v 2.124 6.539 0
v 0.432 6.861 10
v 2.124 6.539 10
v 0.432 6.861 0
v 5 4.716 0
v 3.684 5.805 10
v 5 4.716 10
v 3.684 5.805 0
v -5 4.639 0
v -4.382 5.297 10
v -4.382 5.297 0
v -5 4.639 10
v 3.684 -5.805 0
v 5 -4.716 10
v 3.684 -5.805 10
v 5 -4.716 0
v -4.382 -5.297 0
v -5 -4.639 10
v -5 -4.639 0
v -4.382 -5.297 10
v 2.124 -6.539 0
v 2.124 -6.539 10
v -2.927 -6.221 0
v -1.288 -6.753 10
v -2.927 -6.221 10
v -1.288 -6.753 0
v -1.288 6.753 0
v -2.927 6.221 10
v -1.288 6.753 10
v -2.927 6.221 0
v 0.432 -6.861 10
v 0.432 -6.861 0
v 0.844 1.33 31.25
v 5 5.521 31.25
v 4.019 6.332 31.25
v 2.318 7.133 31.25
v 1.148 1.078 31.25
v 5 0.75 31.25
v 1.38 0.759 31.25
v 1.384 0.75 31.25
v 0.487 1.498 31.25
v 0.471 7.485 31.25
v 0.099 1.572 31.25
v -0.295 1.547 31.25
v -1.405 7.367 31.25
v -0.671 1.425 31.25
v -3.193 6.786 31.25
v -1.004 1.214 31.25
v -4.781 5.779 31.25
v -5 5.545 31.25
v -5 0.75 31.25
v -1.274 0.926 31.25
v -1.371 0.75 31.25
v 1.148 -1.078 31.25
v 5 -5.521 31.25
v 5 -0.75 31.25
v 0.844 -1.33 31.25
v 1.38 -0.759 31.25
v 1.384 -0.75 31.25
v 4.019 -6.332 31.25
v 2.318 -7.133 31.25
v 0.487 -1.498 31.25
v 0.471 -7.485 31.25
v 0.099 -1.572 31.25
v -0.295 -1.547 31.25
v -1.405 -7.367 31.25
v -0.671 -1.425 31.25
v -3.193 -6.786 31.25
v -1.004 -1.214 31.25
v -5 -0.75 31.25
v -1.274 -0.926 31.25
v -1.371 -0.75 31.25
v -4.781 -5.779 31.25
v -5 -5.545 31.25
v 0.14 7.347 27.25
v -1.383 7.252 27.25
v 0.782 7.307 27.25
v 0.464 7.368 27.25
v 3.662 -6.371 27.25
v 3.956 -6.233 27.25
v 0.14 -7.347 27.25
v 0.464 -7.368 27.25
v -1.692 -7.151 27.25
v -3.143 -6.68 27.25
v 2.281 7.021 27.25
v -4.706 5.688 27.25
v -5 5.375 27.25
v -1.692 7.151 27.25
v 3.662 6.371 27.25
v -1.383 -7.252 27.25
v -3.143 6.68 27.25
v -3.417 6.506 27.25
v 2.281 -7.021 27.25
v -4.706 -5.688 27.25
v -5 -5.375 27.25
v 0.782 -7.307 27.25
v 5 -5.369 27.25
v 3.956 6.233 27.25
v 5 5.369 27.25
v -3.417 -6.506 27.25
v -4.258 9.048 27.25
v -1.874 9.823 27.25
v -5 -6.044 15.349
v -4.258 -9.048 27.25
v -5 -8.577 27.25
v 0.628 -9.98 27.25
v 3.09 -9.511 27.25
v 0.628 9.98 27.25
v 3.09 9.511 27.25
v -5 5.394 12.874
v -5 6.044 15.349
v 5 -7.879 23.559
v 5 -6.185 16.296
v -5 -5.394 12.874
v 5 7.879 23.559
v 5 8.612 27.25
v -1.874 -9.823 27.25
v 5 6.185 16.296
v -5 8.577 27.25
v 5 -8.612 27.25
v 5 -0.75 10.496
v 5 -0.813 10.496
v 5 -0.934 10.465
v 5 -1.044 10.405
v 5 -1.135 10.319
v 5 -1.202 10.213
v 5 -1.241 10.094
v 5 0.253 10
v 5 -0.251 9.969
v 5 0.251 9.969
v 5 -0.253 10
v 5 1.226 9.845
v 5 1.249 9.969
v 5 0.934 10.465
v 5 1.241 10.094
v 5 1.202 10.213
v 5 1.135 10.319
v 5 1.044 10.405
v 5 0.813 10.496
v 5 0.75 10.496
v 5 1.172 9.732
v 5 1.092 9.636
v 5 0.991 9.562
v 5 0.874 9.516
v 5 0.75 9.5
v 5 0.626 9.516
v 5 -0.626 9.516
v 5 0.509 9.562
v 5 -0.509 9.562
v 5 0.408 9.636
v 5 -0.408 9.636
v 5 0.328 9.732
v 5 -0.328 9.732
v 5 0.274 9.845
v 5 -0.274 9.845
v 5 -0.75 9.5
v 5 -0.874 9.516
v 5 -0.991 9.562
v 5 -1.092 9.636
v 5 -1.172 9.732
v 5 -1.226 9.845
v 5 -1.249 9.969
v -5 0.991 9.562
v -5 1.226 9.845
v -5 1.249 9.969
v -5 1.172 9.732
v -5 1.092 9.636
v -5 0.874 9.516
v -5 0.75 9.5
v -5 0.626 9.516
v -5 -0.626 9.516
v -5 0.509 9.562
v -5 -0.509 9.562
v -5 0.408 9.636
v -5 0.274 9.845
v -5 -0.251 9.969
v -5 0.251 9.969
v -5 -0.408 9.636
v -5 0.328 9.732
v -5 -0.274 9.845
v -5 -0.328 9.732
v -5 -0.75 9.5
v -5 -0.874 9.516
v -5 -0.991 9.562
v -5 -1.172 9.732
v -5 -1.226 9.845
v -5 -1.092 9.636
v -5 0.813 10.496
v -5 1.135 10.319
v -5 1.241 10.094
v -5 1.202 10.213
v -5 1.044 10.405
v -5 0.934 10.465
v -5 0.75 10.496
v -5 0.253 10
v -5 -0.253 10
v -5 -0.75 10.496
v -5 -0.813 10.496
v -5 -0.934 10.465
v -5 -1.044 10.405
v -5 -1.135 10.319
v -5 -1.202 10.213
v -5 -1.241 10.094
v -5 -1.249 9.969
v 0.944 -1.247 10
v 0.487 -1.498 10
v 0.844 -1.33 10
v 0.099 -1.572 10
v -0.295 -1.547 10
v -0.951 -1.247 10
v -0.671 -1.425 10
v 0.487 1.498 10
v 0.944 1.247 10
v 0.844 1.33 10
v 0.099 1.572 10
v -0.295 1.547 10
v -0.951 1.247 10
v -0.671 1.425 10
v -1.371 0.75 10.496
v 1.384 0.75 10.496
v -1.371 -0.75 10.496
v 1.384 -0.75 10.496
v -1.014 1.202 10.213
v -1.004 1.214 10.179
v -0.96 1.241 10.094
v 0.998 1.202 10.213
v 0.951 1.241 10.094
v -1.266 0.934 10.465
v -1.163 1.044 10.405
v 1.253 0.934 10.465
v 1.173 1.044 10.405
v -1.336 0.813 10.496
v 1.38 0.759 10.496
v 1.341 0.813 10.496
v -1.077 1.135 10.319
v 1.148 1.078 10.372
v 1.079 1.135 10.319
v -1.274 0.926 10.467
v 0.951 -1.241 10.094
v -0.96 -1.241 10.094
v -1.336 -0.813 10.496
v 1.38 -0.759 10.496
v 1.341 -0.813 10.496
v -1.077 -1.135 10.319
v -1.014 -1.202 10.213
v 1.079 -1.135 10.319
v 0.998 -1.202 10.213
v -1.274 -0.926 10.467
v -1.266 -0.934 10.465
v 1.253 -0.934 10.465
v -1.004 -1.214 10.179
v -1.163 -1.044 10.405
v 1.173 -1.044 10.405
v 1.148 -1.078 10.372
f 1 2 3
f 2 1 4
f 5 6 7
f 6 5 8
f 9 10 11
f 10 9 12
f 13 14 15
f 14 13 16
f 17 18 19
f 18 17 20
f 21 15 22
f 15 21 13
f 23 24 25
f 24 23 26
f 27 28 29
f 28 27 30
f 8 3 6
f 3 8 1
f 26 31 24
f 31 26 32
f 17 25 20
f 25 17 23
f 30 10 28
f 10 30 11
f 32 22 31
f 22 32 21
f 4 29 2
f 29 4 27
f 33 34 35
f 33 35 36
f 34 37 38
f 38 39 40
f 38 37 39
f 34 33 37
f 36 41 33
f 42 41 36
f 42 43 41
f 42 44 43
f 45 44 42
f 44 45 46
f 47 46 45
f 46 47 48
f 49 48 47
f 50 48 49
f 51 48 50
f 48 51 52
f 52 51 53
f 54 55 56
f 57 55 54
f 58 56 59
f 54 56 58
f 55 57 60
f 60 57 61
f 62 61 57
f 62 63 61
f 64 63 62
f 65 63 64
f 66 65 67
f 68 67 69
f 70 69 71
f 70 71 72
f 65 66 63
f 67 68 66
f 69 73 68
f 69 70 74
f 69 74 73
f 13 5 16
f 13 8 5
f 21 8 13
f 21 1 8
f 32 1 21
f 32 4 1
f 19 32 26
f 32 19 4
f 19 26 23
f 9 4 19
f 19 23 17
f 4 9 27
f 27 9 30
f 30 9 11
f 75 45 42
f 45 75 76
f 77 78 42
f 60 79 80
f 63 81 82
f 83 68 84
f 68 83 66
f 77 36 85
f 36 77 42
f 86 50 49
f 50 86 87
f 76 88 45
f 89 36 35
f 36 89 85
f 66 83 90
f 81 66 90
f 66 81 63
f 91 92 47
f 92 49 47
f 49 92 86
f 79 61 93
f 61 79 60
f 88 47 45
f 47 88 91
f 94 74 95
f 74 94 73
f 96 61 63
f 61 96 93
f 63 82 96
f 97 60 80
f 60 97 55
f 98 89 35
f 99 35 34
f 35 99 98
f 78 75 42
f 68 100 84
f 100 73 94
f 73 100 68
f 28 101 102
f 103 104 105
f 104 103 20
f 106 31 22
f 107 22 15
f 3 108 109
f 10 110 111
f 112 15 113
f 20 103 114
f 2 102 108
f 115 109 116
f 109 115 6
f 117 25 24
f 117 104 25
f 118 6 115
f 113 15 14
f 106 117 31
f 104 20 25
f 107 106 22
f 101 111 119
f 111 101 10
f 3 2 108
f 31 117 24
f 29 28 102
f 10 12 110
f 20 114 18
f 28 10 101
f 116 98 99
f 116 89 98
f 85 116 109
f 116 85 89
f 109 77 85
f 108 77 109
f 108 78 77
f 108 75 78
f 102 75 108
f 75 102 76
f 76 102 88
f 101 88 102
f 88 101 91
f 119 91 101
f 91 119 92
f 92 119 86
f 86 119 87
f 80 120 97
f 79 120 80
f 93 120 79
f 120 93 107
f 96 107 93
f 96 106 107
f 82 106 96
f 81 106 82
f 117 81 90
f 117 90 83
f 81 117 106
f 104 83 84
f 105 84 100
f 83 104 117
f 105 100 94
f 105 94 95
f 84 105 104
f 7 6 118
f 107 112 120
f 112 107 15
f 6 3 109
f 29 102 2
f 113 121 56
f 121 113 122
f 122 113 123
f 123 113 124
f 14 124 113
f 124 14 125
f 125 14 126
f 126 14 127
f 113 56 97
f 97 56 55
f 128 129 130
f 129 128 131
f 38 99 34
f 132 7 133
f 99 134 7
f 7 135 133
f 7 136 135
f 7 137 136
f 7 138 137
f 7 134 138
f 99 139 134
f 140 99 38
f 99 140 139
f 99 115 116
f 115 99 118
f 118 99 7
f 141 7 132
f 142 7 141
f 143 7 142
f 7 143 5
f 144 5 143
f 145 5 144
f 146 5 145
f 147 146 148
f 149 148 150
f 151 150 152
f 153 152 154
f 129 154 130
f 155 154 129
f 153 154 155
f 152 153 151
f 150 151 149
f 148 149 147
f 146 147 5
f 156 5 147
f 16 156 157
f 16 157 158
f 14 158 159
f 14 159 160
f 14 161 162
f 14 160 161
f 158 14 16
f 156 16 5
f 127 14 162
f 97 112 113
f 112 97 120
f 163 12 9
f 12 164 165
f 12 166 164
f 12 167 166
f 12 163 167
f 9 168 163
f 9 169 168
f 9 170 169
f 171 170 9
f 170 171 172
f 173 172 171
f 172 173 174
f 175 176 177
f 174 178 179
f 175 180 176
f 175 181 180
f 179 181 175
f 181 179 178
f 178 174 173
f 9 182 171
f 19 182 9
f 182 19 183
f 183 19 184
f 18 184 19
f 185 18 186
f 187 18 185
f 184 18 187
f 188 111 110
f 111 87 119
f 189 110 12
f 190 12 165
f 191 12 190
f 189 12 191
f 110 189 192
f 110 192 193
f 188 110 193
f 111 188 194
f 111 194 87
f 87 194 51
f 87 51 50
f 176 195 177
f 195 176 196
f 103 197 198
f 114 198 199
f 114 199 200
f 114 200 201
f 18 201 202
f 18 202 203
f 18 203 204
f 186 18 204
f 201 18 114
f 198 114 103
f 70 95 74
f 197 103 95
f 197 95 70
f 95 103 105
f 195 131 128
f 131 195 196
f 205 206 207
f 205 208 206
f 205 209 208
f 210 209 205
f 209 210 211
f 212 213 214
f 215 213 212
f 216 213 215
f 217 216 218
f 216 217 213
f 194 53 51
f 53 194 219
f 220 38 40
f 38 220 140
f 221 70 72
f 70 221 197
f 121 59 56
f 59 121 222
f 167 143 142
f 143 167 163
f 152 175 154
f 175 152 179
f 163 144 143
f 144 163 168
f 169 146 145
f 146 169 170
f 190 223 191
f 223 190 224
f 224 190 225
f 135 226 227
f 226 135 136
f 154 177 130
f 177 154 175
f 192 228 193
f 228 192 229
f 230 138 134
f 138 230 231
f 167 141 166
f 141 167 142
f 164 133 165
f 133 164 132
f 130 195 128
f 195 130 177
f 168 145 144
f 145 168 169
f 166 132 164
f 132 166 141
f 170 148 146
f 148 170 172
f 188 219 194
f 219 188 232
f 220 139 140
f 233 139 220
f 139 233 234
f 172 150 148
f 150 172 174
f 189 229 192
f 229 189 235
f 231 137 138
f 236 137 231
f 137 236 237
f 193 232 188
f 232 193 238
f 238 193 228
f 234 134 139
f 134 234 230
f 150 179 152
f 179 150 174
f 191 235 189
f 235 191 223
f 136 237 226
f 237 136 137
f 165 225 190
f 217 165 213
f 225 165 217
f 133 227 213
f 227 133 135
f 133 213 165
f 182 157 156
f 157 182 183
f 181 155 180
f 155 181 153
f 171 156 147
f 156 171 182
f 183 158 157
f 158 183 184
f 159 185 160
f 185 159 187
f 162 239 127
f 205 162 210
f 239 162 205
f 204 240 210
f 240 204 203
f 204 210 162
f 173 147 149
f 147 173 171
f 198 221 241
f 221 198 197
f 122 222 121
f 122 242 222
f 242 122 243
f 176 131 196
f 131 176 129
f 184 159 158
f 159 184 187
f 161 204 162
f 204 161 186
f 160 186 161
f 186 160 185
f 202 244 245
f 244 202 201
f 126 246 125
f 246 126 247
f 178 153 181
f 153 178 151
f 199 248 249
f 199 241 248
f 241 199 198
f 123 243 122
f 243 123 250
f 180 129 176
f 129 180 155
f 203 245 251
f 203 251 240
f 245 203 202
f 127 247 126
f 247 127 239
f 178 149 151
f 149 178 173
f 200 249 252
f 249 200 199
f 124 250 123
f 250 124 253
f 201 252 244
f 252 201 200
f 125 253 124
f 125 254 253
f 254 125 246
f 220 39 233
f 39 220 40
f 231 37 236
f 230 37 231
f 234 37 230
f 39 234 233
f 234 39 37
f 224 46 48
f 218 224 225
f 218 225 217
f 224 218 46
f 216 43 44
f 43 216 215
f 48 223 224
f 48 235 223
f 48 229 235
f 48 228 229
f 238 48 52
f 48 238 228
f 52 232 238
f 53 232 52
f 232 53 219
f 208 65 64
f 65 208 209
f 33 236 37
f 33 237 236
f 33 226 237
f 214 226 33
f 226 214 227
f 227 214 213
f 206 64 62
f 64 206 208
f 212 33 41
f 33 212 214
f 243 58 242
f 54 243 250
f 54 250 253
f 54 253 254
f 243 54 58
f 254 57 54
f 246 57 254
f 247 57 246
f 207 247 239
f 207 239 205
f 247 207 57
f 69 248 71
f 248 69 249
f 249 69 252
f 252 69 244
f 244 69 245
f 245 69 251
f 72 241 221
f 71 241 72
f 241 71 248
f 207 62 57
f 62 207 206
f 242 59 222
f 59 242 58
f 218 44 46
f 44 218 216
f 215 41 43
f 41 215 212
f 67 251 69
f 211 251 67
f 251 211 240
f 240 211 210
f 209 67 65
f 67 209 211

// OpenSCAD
/*
 * collets4tapHolder.scad
 * 
 * Written by aubenc @ Thingiverse
 *
 * http://www.thingiverse.com/thing:16956
 *
 * This script is licensed under the
 * Attribution - Share Alike license
 *
 * This is a derivative work of "Tap holder" by Rasle500
 *
 *		http://www.thingiverse.com/thing:16682
 *
 * ...and the derivatives of that work:
 *
 *		http://www.thingiverse.com/thing:16839
 *		http://www.thingiverse.com/thing:16890
 *
 * Usage:
 *
 *    Set the parameters for the desired output, run the required module(s),
 *		render to check, compile and export to STL when/if satisfied.
 *
 */


/* *************** Parameters *********************************************** */
// "C" - Cylindrical, Drill Bit / "H" - Hex, Accessoire
typ="C";		

// Parameters for type "C"
// Drill Bit Diameter
dbd=3;

// Parameters for type "H"
// Distance between opposite faces (Hex only)
f2f=6.25;
// Faces number, should NOT work for any value but 6 (Hex only)
ffn=6;
// opening at... "V" - Vertex / "F" - Face (Hex only)
fop="V";
// Side length of the cube used to exagerate the cut for the vertex (Hex only)
fvs=0.5;

// Common Parameters
// ...gap ...tolerance ... ... ...
gap=0.15;
// Minimum size to keep it open (avoid the walls fusing together)
omn=0.5;

// higher values -> smoother circles (high values dont work with customizer though!)
$fn=25;

/* *************** Modules ************************************************** */

 collet(typ); 


/* *************** Code ***************************************************** */

module collet(typ)
{
	difference()
	{
        if( fop == "V" )
        {
            body();
        }
        else if( fop == "F" )
        {
            rotate([0,0,360/ffn/2]) body();
        }
        
        if( fop == "V" )
        {
            opening();
        }
        else if ( fop == "F" )
        {
            rotate([0,0,360/ffn/2]) opening();
        }
		

		if( typ == "C" )
		{
			drill_bit();
		}
		else if( typ == "H" )
		{
            accessoire_bit();
		}
	}
}

module body()
{
    difference()
	{
        union()
        {
            cylinder(h=31.25, r=13.75/2, center=false);

            translate([0,0,10])
            cylinder(h=31.25-10, r1=13.75/2, r2=15/2, center=false);

            translate([0,0,10])
            cylinder(h=31.25-10-4, r1=13.75/2, r2=20/2, center=false);
        };
        translate([8,0,15.9])
        cube(size=[6,18,32], center=true);
        translate([-8,0,15.9])
        cube(size=[6,18,32], center=true);
    }
}

module drill_bit()
{
    translate([0,0,10])
    cylinder(h=31.25-7+0.2, r=(dbd+gap)/2, center=false);
}

module opening()
{
    ono=2;
	oy=dbd/ono > omn ? dbd/ono : omn;

	translate([0,0,10])
	for(i=[0:ono-1])
	{
		rotate([0,0,i*360/ono])
		translate([6,0,31.25/2])
		cube(size=[12,oy,31.25], center=true);
	}
    
    // little cylinders at bottom of opening for better bending
    translate([0,oy/2,10])
    rotate([0,90,0])
    cylinder(h=11, r=0.5, center=true);
    
    translate([0,-oy/2,10])
    rotate([0,90,0])
    cylinder(h=11, r=0.5, center=true);
}

module accessoire_bit()
{
	lf=360/ffn;
	fod=f2f/sin(lf);

	union()
	{
		translate([0,0,10])
		cylinder(h=31.25+0.2, r=(fod+gap)/2, $fn=ffn, center=false);
		
		if( fvs != 0 )
		{
            xd=(fod+gap+fvs)/2-(fvs*cos(lf)/2/sin(lf))-0.05;
			for(i=[0:ffn-1])
			{
                x=xd*cos(i*lf);
                y=xd*sin(i*lf);
				translate([x,y,10+(31.25/2)])
				rotate([0,0,i*lf])
				cube([fvs,fvs,31.25], center=true);
			}
		}
	}
}
